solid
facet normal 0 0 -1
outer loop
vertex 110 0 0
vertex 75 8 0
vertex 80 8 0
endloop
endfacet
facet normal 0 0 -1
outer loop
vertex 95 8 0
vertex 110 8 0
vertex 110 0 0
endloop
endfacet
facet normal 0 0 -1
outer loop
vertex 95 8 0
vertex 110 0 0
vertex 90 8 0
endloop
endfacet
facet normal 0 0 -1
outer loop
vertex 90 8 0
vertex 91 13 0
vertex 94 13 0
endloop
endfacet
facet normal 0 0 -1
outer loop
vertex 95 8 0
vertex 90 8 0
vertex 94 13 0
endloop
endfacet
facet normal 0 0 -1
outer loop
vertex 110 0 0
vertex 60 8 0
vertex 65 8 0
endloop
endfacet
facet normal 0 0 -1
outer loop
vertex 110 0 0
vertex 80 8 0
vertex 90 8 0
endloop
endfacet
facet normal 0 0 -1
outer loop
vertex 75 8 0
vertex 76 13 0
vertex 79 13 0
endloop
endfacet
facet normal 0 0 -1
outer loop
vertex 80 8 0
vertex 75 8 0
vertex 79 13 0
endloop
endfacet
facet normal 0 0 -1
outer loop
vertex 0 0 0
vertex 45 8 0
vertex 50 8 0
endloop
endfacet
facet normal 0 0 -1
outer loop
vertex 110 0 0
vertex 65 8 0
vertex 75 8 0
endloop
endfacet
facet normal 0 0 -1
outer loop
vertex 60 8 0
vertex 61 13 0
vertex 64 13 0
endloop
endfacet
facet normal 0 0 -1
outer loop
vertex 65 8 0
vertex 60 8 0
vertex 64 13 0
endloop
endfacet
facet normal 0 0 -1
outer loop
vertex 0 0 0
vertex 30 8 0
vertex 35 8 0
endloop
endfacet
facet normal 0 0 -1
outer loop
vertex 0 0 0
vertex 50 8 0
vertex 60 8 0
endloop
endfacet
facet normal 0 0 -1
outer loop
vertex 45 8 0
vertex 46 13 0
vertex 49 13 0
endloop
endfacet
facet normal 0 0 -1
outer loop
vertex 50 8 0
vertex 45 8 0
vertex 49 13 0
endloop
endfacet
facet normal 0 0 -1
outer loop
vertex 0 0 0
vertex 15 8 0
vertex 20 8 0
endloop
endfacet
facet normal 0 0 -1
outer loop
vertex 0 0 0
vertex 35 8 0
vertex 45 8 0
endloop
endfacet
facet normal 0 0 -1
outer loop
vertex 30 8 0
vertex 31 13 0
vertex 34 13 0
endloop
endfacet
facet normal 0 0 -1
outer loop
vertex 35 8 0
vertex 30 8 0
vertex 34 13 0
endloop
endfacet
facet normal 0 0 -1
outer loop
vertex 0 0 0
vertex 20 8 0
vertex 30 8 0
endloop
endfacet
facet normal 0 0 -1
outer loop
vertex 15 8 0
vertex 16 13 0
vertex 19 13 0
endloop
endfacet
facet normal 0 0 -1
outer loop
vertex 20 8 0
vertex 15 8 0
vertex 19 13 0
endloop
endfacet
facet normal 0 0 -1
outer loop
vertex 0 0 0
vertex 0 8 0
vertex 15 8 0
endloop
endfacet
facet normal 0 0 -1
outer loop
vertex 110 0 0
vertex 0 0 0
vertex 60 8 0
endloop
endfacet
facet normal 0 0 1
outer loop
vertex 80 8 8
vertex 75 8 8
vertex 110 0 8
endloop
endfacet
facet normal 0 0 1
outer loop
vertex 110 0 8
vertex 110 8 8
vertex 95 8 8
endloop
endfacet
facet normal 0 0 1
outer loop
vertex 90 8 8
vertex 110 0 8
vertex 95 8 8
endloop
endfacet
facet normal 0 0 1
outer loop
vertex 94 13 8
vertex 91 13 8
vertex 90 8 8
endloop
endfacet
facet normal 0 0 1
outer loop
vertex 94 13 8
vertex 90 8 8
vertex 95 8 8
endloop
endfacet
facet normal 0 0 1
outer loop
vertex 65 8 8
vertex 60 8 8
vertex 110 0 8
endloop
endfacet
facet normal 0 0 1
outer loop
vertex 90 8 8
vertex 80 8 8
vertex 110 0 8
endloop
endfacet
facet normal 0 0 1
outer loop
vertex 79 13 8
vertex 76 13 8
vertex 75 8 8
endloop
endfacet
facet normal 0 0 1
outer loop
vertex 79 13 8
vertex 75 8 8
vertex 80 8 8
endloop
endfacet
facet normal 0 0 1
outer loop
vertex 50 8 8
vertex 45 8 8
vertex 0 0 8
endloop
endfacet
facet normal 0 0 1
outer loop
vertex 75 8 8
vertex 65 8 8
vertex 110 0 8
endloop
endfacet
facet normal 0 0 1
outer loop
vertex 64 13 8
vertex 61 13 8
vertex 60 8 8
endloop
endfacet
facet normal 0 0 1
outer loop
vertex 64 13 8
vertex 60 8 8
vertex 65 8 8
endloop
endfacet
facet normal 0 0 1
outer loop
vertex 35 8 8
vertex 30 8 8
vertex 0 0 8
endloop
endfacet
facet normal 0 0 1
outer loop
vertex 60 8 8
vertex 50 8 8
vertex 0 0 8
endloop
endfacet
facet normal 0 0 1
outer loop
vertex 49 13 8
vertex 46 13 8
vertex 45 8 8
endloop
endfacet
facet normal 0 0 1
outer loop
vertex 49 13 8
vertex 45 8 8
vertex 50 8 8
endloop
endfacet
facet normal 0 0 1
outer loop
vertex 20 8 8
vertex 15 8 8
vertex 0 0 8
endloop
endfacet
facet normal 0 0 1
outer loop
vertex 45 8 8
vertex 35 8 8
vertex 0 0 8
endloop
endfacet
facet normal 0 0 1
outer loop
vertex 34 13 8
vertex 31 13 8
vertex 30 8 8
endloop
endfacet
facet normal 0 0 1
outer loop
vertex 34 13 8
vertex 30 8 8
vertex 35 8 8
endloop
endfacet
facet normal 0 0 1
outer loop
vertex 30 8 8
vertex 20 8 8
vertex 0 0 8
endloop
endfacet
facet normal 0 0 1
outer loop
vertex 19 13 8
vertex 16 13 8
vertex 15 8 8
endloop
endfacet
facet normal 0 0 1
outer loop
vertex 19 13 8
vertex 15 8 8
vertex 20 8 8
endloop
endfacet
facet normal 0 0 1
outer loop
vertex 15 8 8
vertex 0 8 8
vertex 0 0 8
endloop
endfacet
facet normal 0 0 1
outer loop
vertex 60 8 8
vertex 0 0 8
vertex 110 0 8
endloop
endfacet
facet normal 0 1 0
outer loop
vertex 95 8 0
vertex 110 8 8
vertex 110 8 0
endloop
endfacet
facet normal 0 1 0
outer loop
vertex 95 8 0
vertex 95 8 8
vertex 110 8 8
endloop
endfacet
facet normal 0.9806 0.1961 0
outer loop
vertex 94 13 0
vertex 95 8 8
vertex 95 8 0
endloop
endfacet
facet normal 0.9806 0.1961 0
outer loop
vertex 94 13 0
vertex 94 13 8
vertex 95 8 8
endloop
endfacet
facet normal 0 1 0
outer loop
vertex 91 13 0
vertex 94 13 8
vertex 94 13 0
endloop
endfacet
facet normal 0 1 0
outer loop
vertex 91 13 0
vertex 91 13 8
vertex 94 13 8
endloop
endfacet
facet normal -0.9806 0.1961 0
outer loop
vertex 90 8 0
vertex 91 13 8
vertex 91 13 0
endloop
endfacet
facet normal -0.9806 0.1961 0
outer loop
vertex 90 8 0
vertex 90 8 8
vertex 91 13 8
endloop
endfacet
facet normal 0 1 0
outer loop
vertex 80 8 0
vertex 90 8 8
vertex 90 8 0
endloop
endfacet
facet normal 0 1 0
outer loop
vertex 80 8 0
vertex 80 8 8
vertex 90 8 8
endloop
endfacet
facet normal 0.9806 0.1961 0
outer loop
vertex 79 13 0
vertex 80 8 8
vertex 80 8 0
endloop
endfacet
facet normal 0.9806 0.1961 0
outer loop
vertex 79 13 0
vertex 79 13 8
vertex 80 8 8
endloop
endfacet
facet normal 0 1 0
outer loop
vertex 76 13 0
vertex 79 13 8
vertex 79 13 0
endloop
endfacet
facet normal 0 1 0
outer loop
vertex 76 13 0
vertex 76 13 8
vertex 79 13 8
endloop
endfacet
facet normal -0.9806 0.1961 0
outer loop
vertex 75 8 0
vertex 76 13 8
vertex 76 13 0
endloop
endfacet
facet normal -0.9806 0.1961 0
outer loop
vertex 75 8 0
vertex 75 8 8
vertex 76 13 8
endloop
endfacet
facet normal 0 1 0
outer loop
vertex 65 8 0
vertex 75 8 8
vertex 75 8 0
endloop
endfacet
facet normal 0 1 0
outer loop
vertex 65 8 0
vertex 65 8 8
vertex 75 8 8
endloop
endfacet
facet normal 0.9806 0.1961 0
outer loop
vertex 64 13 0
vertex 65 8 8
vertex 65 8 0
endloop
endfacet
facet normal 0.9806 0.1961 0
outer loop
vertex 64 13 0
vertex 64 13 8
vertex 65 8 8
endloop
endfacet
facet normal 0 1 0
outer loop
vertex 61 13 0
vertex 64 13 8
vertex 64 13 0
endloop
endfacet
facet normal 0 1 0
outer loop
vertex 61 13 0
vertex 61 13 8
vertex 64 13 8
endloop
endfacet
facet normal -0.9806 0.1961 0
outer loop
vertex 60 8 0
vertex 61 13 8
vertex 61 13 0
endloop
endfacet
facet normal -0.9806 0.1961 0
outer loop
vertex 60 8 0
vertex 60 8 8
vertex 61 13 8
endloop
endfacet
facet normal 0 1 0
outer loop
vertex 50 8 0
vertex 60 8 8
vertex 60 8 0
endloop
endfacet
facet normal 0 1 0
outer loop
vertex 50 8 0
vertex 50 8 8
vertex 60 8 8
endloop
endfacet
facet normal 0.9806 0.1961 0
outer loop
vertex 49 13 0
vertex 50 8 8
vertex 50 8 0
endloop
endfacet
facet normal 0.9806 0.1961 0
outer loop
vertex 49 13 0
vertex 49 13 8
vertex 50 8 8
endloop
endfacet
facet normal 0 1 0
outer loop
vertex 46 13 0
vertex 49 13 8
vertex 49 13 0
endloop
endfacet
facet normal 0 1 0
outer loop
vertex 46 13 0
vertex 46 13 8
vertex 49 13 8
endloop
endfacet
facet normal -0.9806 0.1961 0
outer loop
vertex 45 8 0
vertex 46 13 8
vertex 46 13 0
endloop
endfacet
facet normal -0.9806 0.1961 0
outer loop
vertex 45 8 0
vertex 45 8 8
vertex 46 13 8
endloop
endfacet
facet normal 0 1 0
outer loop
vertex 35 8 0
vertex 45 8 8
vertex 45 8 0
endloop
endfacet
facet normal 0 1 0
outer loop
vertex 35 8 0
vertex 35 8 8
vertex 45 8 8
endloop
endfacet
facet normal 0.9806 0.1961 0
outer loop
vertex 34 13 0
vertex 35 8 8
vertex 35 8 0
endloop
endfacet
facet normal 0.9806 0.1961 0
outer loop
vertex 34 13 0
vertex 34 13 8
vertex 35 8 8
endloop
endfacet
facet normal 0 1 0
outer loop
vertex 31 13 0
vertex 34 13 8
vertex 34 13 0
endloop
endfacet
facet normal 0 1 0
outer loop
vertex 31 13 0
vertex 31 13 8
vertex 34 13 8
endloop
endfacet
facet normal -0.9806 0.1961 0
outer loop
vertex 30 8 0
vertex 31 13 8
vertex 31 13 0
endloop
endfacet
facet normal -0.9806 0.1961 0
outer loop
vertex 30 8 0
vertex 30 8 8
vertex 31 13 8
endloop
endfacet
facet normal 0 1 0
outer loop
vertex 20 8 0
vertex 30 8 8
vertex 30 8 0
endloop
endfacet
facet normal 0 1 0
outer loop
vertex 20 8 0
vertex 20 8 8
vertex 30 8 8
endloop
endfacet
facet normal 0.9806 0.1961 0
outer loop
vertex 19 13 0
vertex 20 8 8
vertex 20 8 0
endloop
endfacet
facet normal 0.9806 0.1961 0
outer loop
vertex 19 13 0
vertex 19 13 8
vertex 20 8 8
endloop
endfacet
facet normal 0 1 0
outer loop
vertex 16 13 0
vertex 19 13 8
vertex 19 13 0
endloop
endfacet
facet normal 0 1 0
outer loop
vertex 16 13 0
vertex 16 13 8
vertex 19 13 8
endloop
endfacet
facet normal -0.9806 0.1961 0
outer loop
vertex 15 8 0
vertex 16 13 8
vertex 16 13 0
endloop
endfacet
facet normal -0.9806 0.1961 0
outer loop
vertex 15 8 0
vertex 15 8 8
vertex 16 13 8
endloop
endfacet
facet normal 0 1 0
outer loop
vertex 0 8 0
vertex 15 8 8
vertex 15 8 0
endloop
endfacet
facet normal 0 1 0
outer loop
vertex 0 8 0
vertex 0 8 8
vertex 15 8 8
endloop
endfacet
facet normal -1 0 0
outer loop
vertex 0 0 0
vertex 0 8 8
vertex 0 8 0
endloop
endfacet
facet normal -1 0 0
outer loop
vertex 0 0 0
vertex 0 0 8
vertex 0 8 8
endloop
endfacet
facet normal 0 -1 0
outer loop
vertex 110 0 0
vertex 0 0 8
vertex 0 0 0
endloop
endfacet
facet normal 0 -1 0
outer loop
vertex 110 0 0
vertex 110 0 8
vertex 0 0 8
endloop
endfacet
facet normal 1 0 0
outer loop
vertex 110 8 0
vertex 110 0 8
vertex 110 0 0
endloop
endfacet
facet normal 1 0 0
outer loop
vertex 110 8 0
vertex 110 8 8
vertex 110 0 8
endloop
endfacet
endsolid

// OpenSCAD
$fn = 32;

// ----------------------------------------------------------------------
// Gear rack: 6 teeth on a 110 mm bar, pitch 15 mm
// ----------------------------------------------------------------------

// --- parameters (mm) ---
profile_height = 8;       // extrusion height
profile_points = 28;      // points of the closed outline

profile = [[0, 0], [110, 0], [110, 8], [95, 8], [94, 13], [91, 13], [90, 8], [80, 8], [79, 13], [76, 13], [75, 8], [65, 8], [64, 13], [61, 13], [60, 8], [50, 8], [49, 13], [46, 13], [45, 8], [35, 8], [34, 13], [31, 13], [30, 8], [20, 8], [19, 13], [16, 13], [15, 8], [0, 8]];  // single closed polygon, 28 points, counter clockwise

// --- the one profile operation ---
linear_extrude(height = profile_height) polygon(points = profile);
